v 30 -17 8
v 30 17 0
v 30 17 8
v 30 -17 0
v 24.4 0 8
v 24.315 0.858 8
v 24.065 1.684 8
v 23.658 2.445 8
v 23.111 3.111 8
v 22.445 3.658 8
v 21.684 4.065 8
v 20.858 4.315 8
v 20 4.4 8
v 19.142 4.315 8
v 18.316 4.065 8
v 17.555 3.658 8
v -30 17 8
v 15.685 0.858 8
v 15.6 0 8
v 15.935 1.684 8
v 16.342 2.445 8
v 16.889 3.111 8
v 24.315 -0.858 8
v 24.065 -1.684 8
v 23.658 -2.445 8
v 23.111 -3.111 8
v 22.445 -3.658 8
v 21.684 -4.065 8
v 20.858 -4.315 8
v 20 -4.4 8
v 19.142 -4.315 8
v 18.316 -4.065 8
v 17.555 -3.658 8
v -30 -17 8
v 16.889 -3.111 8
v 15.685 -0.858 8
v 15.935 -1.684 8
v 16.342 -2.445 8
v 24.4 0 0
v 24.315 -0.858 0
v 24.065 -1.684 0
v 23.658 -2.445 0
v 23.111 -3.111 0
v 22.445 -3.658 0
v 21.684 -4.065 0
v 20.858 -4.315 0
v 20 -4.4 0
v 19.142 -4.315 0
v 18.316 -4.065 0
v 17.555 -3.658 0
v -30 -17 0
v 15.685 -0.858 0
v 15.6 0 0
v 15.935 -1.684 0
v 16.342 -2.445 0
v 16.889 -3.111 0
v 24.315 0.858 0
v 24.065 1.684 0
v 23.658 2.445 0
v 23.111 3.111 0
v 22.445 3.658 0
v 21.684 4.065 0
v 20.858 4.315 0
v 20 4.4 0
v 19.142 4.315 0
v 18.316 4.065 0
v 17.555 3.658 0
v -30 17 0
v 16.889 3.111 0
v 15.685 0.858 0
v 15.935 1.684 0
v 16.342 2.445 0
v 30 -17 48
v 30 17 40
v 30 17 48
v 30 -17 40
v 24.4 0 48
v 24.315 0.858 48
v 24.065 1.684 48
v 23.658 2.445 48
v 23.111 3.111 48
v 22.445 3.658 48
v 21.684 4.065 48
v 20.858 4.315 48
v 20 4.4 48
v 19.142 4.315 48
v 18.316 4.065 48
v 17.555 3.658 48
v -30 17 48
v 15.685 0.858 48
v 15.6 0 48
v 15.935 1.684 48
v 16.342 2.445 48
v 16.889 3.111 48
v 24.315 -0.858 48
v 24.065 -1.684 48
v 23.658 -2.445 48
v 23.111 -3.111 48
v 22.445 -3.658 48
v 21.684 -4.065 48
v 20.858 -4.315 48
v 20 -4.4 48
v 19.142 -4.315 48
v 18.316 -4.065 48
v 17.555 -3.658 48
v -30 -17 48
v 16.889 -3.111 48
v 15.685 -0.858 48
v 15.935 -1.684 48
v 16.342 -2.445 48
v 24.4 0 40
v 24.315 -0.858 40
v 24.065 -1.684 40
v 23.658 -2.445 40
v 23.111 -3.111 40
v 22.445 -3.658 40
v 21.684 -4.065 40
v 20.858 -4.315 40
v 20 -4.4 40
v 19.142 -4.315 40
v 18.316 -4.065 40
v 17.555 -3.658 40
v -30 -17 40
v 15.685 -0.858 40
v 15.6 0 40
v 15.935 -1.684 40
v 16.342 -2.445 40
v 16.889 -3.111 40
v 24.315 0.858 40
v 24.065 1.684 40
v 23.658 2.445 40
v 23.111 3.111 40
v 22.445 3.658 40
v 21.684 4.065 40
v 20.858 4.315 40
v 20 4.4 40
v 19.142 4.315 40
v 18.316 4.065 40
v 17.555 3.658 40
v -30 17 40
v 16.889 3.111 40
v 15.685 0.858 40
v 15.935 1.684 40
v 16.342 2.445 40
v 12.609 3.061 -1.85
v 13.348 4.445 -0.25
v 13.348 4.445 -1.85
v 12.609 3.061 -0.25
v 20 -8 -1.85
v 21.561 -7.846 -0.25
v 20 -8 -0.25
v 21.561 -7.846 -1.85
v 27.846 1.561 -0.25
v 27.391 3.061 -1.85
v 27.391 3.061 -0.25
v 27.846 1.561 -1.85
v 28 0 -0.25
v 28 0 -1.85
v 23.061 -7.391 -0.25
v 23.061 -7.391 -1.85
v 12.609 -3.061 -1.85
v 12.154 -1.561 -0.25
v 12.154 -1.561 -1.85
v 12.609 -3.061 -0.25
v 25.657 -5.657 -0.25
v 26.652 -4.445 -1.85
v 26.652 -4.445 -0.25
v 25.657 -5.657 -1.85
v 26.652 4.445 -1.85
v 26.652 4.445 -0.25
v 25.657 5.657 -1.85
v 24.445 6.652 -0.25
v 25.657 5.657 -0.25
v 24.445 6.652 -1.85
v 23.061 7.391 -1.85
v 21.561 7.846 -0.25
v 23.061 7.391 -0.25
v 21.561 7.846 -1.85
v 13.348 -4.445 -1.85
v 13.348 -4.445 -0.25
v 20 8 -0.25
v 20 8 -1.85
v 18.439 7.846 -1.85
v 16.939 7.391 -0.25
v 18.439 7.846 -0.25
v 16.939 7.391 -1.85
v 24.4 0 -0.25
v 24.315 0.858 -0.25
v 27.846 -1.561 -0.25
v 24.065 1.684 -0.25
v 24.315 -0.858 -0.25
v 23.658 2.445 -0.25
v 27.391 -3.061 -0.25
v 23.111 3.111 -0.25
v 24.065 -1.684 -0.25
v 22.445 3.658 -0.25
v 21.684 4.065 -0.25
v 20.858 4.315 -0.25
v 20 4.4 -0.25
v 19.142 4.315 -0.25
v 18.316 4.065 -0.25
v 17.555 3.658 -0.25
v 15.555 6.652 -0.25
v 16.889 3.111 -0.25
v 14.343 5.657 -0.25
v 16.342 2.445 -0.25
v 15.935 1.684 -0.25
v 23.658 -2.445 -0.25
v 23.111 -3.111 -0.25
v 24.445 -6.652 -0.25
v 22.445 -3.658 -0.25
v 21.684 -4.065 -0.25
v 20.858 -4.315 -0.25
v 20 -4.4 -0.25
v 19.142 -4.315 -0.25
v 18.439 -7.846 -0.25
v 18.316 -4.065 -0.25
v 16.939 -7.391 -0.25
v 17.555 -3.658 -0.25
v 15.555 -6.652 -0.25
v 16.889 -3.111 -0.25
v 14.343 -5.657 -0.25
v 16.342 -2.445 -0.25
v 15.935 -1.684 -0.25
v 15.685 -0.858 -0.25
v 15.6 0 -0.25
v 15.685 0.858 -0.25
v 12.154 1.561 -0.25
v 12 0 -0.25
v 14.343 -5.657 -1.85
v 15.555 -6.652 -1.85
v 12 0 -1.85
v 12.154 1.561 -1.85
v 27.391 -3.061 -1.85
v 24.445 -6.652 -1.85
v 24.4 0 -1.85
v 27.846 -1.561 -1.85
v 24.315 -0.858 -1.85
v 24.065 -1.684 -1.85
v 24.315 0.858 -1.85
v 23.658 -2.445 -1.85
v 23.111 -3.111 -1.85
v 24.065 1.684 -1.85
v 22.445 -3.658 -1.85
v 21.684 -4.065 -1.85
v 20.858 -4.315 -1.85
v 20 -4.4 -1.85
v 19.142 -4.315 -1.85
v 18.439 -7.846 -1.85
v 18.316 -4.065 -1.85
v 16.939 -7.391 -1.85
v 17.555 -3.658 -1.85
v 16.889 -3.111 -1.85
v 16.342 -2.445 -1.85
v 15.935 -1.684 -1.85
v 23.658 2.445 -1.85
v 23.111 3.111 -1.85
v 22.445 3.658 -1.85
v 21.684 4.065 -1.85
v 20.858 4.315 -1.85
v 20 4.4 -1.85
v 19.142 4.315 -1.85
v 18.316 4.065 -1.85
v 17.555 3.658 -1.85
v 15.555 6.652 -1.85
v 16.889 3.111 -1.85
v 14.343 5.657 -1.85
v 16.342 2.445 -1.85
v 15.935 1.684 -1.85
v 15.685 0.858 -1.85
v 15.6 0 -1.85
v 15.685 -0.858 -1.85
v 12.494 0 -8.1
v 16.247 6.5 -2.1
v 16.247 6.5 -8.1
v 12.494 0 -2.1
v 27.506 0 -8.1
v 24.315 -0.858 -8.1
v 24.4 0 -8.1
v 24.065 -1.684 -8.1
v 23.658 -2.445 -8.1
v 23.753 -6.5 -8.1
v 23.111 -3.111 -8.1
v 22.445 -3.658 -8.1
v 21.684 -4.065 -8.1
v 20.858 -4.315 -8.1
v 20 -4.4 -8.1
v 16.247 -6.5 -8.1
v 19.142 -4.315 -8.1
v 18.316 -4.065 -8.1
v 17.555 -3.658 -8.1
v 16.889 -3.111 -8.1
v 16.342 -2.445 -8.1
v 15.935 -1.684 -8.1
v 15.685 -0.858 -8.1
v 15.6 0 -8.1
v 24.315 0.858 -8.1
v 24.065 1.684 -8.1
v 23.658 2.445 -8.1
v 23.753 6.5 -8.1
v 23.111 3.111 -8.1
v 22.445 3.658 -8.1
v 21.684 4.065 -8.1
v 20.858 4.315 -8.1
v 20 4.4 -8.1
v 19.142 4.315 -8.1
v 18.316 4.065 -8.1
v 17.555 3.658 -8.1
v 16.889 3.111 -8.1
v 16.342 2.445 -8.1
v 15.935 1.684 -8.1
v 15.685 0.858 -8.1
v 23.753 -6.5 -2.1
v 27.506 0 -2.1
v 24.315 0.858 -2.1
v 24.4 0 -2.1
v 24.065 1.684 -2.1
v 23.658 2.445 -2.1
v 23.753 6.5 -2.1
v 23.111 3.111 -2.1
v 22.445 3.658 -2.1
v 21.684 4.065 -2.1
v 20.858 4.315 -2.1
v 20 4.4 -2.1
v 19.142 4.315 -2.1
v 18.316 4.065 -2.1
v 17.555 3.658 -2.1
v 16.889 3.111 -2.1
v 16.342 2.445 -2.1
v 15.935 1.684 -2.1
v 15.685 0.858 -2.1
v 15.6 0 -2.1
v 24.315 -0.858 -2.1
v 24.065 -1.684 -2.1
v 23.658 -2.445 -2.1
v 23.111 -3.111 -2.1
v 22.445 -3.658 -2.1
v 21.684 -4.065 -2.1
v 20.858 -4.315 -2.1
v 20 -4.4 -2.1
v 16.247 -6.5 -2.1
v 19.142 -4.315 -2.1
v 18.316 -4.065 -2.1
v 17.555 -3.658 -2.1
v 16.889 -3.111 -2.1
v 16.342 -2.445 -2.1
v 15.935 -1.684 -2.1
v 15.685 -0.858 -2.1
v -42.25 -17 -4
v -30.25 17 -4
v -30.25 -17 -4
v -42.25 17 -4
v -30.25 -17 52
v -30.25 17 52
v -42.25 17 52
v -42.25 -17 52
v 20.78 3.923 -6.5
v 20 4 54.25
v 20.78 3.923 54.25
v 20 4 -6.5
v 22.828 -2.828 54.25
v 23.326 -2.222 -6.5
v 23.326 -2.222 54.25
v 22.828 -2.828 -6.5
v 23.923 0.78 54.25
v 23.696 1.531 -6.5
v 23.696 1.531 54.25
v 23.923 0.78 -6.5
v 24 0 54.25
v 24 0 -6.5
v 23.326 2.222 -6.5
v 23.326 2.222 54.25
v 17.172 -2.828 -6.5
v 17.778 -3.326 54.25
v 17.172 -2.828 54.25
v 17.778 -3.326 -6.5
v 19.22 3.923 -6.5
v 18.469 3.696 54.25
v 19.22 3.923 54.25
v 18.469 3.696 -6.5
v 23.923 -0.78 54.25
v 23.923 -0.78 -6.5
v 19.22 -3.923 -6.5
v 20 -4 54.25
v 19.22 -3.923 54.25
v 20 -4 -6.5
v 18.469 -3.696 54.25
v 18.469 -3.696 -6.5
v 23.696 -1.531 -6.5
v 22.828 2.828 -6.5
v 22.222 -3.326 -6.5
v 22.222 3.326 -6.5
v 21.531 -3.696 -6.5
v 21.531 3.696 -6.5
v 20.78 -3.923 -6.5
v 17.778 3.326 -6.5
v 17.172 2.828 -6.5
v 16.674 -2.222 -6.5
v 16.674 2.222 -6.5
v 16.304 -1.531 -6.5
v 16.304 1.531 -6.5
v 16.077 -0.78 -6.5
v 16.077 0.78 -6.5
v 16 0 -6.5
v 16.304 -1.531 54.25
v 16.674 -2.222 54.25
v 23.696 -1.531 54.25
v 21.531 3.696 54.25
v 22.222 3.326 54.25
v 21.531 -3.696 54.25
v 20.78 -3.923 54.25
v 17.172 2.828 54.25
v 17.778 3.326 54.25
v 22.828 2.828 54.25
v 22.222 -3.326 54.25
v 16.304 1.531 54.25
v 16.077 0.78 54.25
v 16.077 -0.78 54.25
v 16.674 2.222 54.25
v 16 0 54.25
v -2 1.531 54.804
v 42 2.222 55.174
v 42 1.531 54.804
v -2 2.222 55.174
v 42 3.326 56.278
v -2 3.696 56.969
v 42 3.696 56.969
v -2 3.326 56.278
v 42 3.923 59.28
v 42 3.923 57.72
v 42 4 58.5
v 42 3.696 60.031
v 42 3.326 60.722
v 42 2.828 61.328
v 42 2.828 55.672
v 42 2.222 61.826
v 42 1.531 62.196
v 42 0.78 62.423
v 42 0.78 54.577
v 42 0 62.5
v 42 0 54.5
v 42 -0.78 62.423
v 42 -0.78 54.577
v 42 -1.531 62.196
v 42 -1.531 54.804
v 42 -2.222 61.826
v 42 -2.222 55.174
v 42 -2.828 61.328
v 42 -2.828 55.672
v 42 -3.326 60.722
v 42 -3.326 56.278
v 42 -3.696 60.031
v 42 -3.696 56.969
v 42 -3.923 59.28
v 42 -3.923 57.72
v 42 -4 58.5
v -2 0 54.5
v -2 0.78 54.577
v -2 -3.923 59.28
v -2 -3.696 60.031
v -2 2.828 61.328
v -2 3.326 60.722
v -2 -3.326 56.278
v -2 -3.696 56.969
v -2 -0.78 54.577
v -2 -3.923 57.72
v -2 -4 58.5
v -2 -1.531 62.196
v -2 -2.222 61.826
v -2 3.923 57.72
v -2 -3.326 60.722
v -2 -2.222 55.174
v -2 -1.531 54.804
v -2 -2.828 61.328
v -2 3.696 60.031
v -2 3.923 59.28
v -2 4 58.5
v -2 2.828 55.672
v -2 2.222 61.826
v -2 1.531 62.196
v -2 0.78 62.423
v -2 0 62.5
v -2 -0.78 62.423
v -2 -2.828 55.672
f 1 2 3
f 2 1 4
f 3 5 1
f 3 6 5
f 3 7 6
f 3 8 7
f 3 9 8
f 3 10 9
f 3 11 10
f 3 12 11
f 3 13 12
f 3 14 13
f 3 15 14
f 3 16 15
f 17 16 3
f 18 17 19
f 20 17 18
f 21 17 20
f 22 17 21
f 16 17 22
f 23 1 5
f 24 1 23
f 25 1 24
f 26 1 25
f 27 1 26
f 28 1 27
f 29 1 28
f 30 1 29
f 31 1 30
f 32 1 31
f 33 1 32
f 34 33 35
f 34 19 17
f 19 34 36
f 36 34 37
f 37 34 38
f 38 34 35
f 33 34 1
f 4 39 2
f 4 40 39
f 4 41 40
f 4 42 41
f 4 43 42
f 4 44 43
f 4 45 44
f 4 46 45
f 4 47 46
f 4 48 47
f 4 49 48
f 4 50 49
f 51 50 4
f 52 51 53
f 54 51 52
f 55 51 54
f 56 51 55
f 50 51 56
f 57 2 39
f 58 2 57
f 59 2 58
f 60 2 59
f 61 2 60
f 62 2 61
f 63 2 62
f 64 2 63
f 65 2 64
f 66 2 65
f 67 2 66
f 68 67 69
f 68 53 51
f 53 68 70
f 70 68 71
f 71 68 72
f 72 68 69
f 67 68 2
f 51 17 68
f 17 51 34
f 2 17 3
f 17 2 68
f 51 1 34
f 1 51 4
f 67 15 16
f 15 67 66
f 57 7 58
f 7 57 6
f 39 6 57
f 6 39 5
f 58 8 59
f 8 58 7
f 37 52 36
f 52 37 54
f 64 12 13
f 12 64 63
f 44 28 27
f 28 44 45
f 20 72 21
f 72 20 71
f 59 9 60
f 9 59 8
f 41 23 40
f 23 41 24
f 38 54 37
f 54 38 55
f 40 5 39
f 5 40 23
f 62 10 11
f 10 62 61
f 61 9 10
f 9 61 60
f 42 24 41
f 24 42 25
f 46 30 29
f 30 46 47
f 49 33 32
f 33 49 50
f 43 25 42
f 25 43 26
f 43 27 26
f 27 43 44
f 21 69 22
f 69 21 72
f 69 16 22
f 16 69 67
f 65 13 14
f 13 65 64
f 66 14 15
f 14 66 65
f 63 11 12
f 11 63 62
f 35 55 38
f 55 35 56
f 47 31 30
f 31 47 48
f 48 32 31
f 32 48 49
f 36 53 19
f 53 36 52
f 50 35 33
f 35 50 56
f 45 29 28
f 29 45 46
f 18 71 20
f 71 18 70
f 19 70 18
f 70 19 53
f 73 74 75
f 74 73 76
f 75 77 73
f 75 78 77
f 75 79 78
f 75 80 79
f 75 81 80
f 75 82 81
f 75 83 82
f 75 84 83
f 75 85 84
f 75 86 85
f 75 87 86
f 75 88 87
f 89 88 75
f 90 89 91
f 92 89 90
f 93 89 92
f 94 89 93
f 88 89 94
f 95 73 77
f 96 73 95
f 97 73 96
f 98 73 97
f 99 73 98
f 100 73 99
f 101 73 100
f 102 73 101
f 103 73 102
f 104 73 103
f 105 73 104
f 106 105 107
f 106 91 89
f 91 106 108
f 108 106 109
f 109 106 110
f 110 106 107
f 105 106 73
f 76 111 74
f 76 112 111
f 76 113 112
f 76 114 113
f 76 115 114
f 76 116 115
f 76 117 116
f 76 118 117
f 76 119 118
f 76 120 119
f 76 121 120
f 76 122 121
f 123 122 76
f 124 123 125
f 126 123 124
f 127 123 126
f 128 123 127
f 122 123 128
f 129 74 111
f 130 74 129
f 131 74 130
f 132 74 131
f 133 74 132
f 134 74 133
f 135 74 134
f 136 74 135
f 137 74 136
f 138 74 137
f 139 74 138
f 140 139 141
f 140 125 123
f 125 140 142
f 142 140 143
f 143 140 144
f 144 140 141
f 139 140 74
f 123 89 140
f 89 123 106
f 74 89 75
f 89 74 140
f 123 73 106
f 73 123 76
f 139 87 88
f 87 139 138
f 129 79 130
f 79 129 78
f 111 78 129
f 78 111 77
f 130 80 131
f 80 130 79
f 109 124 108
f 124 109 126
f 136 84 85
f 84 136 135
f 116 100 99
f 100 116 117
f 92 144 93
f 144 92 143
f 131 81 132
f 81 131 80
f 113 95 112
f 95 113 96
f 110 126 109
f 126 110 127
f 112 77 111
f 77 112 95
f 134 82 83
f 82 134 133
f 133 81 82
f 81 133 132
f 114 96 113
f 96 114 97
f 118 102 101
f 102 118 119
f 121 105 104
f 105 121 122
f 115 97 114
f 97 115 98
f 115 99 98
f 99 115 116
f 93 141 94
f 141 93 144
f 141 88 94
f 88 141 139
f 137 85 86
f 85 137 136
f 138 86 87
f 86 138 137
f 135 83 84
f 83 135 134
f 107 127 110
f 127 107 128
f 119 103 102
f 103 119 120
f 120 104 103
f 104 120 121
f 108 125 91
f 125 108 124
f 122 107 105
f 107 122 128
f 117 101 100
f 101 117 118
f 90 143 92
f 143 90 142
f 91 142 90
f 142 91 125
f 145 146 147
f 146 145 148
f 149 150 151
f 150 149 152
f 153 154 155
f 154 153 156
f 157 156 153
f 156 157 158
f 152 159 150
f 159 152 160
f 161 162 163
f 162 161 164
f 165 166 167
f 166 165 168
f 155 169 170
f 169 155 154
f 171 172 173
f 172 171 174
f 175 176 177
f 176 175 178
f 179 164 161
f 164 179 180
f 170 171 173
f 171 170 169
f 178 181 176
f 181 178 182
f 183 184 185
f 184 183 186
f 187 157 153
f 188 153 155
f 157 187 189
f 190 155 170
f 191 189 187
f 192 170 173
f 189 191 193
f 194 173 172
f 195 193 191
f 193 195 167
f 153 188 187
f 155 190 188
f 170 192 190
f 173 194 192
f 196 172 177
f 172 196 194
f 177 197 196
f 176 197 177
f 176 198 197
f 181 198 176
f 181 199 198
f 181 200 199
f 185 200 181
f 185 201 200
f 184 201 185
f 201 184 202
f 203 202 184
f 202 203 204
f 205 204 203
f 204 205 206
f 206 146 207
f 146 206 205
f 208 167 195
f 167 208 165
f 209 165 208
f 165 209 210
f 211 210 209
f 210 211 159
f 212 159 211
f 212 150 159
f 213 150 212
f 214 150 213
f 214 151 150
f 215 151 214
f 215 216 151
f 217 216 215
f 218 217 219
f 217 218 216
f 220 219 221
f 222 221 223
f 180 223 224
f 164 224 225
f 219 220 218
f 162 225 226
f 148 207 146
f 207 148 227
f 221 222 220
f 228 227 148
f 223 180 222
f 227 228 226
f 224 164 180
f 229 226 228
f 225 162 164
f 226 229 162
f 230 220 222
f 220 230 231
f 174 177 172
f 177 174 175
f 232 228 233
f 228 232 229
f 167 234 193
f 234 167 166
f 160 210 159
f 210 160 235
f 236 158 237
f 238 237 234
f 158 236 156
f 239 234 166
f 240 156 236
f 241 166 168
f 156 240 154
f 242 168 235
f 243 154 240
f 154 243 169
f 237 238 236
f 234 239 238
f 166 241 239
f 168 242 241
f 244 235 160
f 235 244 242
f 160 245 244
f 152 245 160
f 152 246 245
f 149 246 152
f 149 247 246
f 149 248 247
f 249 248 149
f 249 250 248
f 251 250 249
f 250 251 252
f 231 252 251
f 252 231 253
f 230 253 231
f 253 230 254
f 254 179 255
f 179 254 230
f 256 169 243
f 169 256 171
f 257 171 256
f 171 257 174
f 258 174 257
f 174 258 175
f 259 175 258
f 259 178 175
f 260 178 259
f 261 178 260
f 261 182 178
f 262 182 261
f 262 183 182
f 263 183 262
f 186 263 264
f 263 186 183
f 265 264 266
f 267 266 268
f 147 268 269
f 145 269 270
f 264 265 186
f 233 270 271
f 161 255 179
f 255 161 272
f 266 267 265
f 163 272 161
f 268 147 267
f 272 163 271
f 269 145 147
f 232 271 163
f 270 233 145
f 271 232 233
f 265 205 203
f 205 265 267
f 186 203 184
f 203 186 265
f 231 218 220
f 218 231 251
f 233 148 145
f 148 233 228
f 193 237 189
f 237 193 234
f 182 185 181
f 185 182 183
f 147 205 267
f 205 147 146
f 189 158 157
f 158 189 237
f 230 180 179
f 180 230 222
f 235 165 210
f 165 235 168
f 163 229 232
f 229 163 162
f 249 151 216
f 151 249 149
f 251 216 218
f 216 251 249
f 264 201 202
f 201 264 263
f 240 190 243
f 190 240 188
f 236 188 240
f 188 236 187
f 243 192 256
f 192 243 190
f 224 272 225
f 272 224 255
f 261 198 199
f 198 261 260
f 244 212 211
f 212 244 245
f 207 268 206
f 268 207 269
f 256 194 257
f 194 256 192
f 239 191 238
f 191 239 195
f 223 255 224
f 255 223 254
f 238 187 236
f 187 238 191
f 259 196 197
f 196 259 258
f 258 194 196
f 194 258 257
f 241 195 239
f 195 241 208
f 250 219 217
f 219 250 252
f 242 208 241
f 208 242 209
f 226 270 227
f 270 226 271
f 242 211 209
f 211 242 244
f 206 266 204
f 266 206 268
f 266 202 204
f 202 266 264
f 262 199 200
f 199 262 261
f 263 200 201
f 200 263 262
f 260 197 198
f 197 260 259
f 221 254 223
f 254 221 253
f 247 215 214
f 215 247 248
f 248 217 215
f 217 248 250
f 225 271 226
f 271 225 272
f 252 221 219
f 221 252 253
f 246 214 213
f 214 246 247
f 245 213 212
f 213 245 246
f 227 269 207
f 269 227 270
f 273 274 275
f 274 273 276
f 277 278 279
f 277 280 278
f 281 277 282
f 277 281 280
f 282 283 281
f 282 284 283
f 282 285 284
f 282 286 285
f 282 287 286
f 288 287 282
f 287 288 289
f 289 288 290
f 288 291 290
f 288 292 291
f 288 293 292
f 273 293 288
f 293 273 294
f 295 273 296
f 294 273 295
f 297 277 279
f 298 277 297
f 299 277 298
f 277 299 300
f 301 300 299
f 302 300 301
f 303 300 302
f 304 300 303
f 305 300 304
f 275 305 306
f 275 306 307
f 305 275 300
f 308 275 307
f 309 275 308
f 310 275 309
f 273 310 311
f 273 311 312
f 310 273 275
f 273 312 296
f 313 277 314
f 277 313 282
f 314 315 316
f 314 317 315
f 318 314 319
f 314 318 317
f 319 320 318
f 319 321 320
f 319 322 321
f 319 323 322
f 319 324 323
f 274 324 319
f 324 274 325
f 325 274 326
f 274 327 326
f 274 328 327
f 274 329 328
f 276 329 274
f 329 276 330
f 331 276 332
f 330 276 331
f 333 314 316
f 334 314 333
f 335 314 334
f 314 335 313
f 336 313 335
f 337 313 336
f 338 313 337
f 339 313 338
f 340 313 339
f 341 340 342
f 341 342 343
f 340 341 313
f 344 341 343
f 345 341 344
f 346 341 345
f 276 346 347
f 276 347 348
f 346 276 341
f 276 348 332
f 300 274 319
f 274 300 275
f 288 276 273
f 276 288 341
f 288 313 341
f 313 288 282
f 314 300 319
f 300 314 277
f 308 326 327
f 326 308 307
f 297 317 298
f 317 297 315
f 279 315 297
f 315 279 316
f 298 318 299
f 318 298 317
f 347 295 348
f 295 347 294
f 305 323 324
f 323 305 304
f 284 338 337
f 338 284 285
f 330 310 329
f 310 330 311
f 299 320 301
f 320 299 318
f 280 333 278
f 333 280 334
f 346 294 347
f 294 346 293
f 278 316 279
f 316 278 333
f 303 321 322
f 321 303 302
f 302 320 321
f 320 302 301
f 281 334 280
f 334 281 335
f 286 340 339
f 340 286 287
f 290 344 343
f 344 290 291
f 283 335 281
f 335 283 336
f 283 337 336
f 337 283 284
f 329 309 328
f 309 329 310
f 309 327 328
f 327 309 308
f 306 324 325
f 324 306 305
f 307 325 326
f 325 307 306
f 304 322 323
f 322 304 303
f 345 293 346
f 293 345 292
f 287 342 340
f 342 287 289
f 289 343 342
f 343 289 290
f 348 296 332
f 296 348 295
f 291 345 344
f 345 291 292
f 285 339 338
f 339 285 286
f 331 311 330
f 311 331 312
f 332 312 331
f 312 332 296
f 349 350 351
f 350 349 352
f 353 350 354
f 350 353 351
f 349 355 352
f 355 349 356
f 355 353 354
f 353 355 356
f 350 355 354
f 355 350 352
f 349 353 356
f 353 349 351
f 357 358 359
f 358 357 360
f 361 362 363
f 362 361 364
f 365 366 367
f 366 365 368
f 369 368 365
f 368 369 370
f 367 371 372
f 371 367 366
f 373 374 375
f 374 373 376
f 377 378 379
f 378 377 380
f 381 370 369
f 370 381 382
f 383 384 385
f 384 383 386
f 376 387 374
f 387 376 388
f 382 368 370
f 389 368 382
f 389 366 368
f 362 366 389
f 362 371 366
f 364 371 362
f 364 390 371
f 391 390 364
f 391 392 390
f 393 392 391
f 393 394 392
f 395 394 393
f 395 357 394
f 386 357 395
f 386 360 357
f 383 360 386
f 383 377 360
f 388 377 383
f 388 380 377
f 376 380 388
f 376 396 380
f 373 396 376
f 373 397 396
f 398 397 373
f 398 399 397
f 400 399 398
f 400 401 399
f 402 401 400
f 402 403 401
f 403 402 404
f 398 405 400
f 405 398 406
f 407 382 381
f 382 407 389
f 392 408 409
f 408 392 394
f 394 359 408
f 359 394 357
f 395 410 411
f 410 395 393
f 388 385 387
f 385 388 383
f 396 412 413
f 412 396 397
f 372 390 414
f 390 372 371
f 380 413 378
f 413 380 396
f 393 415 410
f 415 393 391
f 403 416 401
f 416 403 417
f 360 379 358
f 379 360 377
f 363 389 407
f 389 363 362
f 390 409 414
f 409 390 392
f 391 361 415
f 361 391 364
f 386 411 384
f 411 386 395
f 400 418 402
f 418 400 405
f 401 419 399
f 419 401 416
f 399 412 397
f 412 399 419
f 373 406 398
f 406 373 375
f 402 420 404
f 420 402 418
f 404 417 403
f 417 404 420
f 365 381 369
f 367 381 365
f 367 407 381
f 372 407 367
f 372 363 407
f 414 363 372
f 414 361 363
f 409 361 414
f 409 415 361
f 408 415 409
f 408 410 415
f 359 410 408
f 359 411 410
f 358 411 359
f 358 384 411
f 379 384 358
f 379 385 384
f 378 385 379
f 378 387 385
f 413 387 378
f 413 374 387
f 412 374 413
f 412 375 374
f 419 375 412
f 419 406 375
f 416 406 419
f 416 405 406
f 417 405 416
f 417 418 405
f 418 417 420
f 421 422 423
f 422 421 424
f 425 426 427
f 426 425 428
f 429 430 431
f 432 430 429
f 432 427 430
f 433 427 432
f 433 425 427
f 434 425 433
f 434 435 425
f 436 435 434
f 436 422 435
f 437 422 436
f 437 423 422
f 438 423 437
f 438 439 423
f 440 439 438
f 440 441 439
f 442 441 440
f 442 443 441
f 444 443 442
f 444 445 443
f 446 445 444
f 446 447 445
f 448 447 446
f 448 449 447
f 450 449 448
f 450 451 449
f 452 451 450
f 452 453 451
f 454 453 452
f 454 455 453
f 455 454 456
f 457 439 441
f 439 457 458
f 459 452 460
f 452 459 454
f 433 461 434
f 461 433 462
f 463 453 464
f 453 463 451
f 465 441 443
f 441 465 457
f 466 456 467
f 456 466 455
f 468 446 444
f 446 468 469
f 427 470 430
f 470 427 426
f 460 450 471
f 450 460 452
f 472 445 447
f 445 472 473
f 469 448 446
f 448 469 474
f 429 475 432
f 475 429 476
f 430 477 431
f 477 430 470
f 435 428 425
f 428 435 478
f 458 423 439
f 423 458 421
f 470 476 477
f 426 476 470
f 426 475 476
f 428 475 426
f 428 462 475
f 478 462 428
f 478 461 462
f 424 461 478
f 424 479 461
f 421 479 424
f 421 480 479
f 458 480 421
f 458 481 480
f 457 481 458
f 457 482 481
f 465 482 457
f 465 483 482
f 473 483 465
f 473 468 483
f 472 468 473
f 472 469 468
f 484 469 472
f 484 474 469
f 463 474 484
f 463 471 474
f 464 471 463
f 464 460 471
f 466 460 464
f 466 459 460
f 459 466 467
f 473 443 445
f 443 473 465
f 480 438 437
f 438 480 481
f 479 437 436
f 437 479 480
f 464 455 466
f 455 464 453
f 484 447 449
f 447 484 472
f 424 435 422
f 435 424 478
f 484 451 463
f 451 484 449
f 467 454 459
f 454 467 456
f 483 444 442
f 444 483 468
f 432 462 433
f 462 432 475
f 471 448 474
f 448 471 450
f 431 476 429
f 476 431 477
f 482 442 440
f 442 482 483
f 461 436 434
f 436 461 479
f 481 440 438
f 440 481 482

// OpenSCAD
$fn = 32;

// ------------------------------------------------------------------------
// C clamp: throat 40 mm, screw d8
// Every part is its own module, assembly() places every instance.
// ------------------------------------------------------------------------

// --- part 1 ---
module clamp_arm() {
  difference() {
    translate([-30, -17, 0]) cube([60, 34, 8]);
    translate([20, 0, -1]) cylinder(h = 10, d = 8.8);
  }
}

// --- part 2 ---
module clamp_spine() {
  difference() {
    translate([-28, -17, 0]) cube([56, 34, 12]);
  }
}

// --- part 3 ---
module clamp_screw() {
  translate([0, 0, -30.375]) cylinder(h = 60.75, d = 8);
}

// --- part 4 ---
module clamp_washer() {
  difference() {
      translate([0, 0, 0]) cylinder(h = 1.6, d = 16);
      translate([0, 0, -1]) cylinder(h = 3.6, d = 8.8);
    }
}

// --- part 5 ---
module clamp_nut() {
  difference() {
    linear_extrude(height = 6) polygon(points = [[7.506, 0], [3.753, 6.5], [-3.753, 6.5], [-7.506, 0], [-3.753, -6.5], [3.753, -6.5]]);
    translate([0, 0, -1]) cylinder(h = 8, d = 8.8);
  }
}

// --- part 6 ---
module tommy_bar() {
  translate([0, 0, -22]) cylinder(h = 44, d = 8);
}

// --- assembly ---
module assembly() {
  color([0.80, 0.24, 0.20]) translate([0, 0, 0]) rotate([0, 0, 0]) clamp_arm();
  color([0.20, 0.45, 0.75]) translate([0, 0, 40]) rotate([0, 0, 0]) clamp_arm();
  color([0.25, 0.62, 0.32]) translate([-42.25, 0, 24]) rotate([0, 90, 0]) clamp_spine();
  color([0.92, 0.70, 0.18]) translate([20, 0, 23.875]) rotate([0, 0, 0]) clamp_screw();
  color([0.58, 0.35, 0.70]) translate([20, 0, -1.85]) rotate([0, 0, 0]) clamp_washer();
  color([0.16, 0.66, 0.66]) translate([20, 0, -8.1]) rotate([0, 0, 0]) clamp_nut();
  color([0.85, 0.48, 0.18]) translate([20, 0, 58.5]) rotate([0, 90, 0]) tommy_bar();
}

assembly();
